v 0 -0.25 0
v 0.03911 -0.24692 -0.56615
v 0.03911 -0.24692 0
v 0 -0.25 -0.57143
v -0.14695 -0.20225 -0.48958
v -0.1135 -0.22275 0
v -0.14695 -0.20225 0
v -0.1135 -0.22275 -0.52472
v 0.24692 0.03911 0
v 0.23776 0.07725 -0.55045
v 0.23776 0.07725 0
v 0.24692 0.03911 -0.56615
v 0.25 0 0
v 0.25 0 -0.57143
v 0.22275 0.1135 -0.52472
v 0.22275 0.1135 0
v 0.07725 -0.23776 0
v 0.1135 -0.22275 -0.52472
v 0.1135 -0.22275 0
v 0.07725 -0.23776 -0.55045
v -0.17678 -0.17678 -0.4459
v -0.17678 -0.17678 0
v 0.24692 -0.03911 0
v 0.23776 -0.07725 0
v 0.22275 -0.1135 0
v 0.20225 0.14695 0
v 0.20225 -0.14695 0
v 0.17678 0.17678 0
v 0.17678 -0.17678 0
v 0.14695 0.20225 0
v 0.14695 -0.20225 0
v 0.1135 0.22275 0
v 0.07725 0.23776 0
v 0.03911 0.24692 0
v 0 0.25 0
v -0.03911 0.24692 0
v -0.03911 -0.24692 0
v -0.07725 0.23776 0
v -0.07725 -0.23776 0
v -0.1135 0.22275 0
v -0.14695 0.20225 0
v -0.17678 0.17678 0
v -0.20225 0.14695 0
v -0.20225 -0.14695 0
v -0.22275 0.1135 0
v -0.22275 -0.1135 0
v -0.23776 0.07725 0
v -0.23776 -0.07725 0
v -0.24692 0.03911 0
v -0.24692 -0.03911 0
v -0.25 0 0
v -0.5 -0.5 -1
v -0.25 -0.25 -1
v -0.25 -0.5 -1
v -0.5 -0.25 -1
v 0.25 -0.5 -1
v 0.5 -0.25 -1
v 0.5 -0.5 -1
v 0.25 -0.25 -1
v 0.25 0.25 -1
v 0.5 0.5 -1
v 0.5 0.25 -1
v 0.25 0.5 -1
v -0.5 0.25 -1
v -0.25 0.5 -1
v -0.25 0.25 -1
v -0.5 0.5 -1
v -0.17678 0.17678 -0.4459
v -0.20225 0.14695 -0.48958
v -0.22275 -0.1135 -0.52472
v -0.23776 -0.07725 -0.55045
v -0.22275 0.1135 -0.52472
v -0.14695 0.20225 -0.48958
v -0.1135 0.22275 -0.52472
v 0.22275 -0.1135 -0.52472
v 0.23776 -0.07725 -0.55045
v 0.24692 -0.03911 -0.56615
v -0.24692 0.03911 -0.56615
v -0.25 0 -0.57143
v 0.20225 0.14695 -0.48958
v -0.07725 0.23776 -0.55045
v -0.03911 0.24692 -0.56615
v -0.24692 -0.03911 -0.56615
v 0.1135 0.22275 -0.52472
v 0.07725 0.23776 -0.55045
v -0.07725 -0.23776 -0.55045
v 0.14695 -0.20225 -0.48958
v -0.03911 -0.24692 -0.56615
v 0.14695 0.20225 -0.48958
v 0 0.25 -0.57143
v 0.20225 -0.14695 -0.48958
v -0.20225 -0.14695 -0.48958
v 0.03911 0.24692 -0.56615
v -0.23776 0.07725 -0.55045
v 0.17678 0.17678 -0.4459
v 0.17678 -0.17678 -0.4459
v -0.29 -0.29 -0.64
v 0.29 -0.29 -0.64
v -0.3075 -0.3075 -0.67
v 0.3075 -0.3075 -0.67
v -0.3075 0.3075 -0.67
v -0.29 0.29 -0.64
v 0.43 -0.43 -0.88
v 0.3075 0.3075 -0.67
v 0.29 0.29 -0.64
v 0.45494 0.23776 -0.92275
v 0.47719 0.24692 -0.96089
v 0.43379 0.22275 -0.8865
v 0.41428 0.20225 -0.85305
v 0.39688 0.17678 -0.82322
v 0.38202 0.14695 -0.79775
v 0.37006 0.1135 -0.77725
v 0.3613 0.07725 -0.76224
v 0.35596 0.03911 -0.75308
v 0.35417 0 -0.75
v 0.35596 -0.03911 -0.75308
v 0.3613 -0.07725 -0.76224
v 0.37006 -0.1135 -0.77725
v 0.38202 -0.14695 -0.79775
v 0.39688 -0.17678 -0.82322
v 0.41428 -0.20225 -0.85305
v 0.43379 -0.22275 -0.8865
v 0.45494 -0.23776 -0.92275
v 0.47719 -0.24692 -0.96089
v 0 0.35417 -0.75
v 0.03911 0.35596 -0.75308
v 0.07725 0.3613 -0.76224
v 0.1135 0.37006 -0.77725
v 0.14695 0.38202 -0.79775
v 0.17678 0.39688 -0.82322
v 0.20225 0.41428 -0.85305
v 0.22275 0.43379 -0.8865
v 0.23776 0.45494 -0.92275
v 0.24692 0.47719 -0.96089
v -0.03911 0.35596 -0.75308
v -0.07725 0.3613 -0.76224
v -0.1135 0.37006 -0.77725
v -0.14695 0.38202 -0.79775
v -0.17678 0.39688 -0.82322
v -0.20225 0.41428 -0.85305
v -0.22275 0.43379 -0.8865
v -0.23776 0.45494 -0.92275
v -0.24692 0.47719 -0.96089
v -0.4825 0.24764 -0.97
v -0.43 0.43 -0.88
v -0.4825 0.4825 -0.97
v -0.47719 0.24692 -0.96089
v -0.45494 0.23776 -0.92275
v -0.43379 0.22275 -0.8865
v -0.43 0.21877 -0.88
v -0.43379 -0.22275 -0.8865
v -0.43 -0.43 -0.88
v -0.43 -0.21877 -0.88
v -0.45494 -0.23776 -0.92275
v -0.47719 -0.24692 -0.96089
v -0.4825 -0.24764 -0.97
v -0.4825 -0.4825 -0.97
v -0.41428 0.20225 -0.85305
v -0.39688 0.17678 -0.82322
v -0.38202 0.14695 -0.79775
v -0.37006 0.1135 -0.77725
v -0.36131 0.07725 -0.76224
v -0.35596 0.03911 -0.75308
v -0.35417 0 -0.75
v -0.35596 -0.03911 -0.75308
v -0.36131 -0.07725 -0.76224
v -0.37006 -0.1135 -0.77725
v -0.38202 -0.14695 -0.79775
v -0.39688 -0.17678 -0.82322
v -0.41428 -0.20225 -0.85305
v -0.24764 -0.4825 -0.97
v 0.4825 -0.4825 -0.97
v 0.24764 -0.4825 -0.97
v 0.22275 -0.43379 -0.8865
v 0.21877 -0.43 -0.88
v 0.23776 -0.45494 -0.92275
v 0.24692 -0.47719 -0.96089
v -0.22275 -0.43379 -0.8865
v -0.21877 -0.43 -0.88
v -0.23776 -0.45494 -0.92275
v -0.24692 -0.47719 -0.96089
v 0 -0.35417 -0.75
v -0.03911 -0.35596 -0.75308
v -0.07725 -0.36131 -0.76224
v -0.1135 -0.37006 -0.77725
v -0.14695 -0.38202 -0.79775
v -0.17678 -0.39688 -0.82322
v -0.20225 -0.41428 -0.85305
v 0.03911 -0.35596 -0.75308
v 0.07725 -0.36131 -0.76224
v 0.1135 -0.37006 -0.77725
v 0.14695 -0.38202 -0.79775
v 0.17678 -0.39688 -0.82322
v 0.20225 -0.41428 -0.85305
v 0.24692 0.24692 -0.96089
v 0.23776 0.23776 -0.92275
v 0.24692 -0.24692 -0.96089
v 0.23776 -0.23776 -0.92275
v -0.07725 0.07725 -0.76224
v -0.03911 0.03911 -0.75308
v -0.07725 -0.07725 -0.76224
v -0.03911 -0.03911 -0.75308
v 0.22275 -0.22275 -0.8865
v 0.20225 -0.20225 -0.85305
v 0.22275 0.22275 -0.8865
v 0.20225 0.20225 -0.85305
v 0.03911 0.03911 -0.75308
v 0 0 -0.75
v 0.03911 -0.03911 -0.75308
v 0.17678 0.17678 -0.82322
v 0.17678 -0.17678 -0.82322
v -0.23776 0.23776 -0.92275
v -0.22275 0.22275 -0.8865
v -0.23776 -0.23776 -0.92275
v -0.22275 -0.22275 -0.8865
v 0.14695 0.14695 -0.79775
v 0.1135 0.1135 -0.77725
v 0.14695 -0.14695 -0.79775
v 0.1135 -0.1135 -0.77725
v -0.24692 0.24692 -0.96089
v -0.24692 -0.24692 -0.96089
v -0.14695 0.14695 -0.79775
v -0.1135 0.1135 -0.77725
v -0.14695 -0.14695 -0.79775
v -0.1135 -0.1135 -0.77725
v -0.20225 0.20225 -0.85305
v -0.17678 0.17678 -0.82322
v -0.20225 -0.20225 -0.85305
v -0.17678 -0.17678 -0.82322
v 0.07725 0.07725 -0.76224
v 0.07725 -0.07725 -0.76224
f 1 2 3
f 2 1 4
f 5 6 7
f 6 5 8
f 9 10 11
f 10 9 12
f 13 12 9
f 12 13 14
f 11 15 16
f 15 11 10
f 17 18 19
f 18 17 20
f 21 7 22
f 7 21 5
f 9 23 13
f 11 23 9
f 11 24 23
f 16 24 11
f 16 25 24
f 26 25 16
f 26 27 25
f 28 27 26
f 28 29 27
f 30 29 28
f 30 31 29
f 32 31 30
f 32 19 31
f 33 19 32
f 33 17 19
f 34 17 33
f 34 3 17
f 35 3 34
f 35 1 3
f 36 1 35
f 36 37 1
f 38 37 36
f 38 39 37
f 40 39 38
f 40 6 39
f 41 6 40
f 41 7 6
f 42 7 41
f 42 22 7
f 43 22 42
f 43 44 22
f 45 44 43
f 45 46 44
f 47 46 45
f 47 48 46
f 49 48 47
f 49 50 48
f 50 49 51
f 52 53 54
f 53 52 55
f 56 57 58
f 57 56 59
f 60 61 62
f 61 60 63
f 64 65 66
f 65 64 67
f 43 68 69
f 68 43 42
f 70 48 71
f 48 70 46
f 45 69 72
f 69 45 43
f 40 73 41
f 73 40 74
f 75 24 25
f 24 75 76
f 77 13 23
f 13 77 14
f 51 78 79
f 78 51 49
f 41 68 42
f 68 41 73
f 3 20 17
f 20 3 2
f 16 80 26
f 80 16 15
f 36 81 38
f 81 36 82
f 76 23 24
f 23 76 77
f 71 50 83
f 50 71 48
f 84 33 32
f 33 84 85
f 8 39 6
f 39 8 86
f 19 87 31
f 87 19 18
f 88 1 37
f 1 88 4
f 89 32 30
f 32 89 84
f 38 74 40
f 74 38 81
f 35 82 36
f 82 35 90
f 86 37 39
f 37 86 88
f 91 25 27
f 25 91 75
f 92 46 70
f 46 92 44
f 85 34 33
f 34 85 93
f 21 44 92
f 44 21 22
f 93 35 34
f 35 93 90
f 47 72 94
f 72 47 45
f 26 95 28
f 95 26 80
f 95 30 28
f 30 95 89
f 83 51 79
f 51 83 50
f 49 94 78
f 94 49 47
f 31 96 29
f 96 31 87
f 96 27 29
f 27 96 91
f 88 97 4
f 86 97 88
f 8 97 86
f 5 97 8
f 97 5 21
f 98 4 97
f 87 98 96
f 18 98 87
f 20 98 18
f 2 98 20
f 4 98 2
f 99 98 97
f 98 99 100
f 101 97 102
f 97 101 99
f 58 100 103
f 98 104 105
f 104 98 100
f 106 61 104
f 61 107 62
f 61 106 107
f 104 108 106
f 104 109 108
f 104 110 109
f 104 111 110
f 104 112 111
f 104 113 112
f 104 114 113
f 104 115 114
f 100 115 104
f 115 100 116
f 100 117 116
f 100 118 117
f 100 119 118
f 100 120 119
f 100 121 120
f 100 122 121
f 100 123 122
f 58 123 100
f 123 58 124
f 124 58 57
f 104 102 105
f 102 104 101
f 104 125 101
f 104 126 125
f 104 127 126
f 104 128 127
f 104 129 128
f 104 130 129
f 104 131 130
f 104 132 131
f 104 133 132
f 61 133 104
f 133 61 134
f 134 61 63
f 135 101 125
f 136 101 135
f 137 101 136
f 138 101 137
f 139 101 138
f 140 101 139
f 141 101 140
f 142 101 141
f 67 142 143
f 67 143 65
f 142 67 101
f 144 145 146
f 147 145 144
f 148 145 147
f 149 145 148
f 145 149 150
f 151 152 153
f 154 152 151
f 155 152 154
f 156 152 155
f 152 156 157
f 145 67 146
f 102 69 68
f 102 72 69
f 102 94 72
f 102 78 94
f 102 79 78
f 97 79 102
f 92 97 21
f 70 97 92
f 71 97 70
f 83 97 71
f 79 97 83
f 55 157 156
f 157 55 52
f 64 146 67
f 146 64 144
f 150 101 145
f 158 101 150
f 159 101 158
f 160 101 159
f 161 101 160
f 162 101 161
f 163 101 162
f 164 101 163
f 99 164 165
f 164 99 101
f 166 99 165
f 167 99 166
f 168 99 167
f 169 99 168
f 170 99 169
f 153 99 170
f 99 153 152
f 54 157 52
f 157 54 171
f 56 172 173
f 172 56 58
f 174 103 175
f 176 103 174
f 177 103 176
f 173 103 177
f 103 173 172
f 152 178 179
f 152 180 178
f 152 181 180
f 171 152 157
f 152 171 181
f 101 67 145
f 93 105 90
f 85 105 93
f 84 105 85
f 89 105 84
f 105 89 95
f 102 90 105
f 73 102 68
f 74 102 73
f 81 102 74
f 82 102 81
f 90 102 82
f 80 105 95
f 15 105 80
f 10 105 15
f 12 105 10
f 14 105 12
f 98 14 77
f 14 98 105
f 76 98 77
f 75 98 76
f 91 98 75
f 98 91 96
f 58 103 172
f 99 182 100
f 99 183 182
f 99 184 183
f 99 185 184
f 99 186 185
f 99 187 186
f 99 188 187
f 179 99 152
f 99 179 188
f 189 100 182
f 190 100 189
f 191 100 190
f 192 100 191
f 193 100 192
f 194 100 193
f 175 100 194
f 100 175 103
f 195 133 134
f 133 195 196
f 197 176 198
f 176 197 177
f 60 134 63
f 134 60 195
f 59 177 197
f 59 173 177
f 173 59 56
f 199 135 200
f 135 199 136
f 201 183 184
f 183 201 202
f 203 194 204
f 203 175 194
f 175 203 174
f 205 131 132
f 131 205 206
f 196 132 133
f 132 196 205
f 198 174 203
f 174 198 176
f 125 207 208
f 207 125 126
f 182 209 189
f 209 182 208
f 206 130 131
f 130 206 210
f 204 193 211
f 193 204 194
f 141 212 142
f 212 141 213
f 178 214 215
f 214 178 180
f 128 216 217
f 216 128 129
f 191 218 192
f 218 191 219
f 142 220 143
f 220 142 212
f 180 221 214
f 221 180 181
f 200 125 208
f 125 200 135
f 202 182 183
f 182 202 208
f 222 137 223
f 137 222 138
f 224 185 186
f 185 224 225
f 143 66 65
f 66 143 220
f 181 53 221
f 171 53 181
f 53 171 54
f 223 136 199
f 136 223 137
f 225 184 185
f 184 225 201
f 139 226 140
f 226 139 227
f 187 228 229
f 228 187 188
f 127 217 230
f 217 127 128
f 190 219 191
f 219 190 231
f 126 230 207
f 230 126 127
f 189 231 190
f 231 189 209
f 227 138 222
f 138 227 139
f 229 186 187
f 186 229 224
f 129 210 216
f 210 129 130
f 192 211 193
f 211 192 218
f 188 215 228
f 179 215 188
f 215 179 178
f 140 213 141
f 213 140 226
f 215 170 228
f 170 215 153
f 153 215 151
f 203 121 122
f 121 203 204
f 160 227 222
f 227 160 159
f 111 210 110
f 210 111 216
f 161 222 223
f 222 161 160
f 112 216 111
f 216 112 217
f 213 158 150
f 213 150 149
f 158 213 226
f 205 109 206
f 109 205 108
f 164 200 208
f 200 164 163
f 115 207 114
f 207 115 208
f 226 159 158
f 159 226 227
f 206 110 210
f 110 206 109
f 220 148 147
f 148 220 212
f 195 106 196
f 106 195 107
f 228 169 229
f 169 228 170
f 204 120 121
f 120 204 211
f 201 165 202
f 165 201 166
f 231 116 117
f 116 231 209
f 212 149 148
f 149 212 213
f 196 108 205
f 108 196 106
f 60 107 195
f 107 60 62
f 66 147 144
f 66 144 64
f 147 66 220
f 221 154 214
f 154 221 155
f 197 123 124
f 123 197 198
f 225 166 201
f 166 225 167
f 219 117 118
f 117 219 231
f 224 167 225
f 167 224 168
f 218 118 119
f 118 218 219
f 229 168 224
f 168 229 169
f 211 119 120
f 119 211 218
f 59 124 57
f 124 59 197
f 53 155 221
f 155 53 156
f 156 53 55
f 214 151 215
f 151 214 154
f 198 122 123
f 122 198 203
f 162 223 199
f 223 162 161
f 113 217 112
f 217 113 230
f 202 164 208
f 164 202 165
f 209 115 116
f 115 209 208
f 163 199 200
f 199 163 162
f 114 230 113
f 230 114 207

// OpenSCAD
//----------------------------------------------
// Eiffel Support 
// Size must be 1x1x1 
//----------------------------------------------
$fn=40;

translate([-0.5,-0.5,-0.5]) 
difference(){
    union() {
        translate([0.5,0.5,0.0]) cylinder(h=1, r1=0.25, r2=0.25, center = true);
        translate([0.5,0.5,-0.5]) linear_extrude(height=0.6, scale=[0.3,0.3], slices=20, twist=0)
     square(1,center = true);
    }
    translate([0.5,0.5,-0.5]) rotate([90,0,0.0]) cylinder(h=1, r=0.25, center = true);
    translate([0.5,0.5,-0.5]) rotate([0,90,0.0]) cylinder(h=1, r=0.25, center = true);
}
